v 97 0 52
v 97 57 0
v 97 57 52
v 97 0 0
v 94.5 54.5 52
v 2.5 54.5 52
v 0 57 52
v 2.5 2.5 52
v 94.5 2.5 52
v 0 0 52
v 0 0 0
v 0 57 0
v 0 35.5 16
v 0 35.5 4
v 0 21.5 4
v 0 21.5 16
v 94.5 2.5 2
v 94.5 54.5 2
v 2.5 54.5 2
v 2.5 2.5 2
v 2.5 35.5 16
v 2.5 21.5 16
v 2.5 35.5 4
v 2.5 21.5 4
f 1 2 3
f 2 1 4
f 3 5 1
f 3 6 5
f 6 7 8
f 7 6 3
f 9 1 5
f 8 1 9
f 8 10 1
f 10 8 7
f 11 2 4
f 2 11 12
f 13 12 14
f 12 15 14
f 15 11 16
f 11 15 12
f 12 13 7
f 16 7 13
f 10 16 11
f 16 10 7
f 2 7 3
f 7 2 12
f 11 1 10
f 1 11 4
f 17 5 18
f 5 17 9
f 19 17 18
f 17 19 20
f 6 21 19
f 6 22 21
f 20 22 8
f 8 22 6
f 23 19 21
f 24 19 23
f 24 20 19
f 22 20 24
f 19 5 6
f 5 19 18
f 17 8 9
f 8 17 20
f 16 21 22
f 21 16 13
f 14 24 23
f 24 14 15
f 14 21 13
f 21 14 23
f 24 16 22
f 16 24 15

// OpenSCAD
// Sats Card Kiosk — enclosure v2 (snap-in board retention, no tape)
// part = "base" or "lid".  z = 0 is the OUTER top surface of the lid.
part = "base";

/* ---------- parameters ---------- */
wall     = 2.5;
floorT   = 2.0;
lidTop   = 2.0;
tapFloor = 1.6;    // plastic over the PN532 (card reads through this)
fit      = 0.4;    // lid-into-base friction fit
boardT   = 1.7;    // PCB thickness (+ a hair)
$fn      = 40;

inL = 92; inW = 52; inH = 50;          // internal cavity (deepened for wire nest)

pnL = 44;  pnW = 42;                    // PN532 V3 footprint
olL = 28;  olW = 29;                    // SSD1306 PCB footprint
olWinL = 25; olWinW = 16;              // OLED screen window

// snap-clip geometry  (fingers grip the board's two long edges)
clipW   = 8;       // finger width (along the board edge) — wider grab
clipT   = 1.4;     // finger thickness
clipGap = 1.0;     // flex gap between finger and pocket wall — a bit looser to slide in
clipNub = 1.6;     // nub length (overhang over the board = clipNub - clipGap = 0.6mm)
nubH    = 1.8;     // nub height — taller catch + longer lead-in ramp
fingerH = boardT + 4;   // finger length into the box — taller so the catch reaches

usbW = 14; usbZ = 2; usbH = 12;

extL = inL + 2*wall;  extW = inW + 2*wall;  baseH = floorT + inH;  lipH = 7;
olCX = 22;  pnCX = 64;  cY = inW/2;

/* ---------- base (unchanged — already fits) ---------- */
module base() {
  difference() {
    cube([extL, extW, baseH]);
    translate([wall, wall, floorT]) cube([inL, inW, inH + 1]);
    translate([-1, wall + inW/2 - usbW/2, floorT + usbZ]) cube([wall + 2, usbW, usbH]);
  }
}

/* ---------- board pocket cut ----------
   Widened in X (the clip axis) so the fingers + flex gap fit; the board is
   located tightly in Y by the pocket walls (the header edge is a Y edge, so it
   stays clip-free). */
module pocketCut(cx, cy, bL, bW, seatZ) {
  padX = clipGap + clipT;
  translate([cx - bL/2 - padX, cy - bW/2, seatZ]) cube([bL + 2*padX, bW, 20]);
}

/* ---------- two cantilever snap clips on the board's LEFT & RIGHT (X) edges ----------
   Placed on the side edges so they never touch the pin headers, which sit on a
   Y edge. Each finger hangs from the pocket ceiling into the box and its nub
   overhangs inward over the board's back face. */
module clips(cx, cy, bL, seatZ) {
  backZ = seatZ + boardT;
  for (s = [-1, 1]) {
    xo = cx + s*(bL/2 + clipGap);                  // finger inner face
    // finger post — taller so the catch reaches over a seated board
    translate([s > 0 ? xo : xo - clipT, cy - clipW/2, seatZ])
      cube([clipT, clipW, fingerH]);
    // wedge nub: flat underside at backZ retains the board; sloped top is a
    // lead-in ramp so the board cams the finger outward as you press it in
    if (s > 0)
      hull() {
        translate([xo - clipNub, cy - clipW/2, backZ])       cube([clipNub, clipW, 0.01]);
        translate([xo - 0.01,    cy - clipW/2, backZ + nubH]) cube([0.01,   clipW, 0.01]);
      }
    else
      hull() {
        translate([xo,        cy - clipW/2, backZ])       cube([clipNub, clipW, 0.01]);
        translate([xo,        cy - clipW/2, backZ + nubH]) cube([0.01,   clipW, 0.01]);
      }
  }
}

/* ---------- lid ---------- */
module lid() {
  difference() {
    union() {
      cube([extL, extW, lidTop]);
      translate([wall + fit, wall + fit, lidTop])
        difference() {
          cube([inL - 2*fit, inW - 2*fit, lipH]);
          translate([wall, wall, -1]) cube([inL - 2*fit - 2*wall, inW - 2*fit - 2*wall, lipH + 2]);
        }
    }
    // OLED screen window (through)
    translate([wall + olCX - olWinL/2, wall + cY - olWinW/2, -1]) cube([olWinL, olWinW, lidTop + 2]);
    // board pockets
    pocketCut(wall + olCX, wall + cY, olL, olW, lidTop - 0.5);   // OLED (front on window ledge)
    pocketCut(wall + pnCX, wall + cY, pnL, pnW, tapFloor);        // PN532 (front under tapFloor)
    // engraving on the outer top face (mirrored in X so it reads correctly
    // once the lid is printed top-face-down and flipped over for use)
    translate([wall + pnCX, wall + cY + 13, -0.1]) mirror([1,0,0])
      linear_extrude(0.9) text("TAP", size=6, halign="center", valign="center", font="Helvetica:style=Bold");
    translate([extL/2, wall + 2.5, -0.1]) mirror([1,0,0])
      linear_extrude(0.9) text("SATS KIOSK", size=4.5, halign="center", valign="baseline", font="Helvetica:style=Bold");
    translate([wall + pnCX, wall + cY - 1, -0.1])
      linear_extrude(0.7) difference() { square([pnL-8, pnW-10], center=true); square([pnL-10, pnW-12], center=true); }
  }
  clips(wall + olCX, wall + cY, olL, lidTop - 0.5);   // OLED clips (left/right edges)
  clips(wall + pnCX, wall + cY, pnL, tapFloor);        // PN532 clips (left/right edges)
}

if (part == "base") base();
else lid();
